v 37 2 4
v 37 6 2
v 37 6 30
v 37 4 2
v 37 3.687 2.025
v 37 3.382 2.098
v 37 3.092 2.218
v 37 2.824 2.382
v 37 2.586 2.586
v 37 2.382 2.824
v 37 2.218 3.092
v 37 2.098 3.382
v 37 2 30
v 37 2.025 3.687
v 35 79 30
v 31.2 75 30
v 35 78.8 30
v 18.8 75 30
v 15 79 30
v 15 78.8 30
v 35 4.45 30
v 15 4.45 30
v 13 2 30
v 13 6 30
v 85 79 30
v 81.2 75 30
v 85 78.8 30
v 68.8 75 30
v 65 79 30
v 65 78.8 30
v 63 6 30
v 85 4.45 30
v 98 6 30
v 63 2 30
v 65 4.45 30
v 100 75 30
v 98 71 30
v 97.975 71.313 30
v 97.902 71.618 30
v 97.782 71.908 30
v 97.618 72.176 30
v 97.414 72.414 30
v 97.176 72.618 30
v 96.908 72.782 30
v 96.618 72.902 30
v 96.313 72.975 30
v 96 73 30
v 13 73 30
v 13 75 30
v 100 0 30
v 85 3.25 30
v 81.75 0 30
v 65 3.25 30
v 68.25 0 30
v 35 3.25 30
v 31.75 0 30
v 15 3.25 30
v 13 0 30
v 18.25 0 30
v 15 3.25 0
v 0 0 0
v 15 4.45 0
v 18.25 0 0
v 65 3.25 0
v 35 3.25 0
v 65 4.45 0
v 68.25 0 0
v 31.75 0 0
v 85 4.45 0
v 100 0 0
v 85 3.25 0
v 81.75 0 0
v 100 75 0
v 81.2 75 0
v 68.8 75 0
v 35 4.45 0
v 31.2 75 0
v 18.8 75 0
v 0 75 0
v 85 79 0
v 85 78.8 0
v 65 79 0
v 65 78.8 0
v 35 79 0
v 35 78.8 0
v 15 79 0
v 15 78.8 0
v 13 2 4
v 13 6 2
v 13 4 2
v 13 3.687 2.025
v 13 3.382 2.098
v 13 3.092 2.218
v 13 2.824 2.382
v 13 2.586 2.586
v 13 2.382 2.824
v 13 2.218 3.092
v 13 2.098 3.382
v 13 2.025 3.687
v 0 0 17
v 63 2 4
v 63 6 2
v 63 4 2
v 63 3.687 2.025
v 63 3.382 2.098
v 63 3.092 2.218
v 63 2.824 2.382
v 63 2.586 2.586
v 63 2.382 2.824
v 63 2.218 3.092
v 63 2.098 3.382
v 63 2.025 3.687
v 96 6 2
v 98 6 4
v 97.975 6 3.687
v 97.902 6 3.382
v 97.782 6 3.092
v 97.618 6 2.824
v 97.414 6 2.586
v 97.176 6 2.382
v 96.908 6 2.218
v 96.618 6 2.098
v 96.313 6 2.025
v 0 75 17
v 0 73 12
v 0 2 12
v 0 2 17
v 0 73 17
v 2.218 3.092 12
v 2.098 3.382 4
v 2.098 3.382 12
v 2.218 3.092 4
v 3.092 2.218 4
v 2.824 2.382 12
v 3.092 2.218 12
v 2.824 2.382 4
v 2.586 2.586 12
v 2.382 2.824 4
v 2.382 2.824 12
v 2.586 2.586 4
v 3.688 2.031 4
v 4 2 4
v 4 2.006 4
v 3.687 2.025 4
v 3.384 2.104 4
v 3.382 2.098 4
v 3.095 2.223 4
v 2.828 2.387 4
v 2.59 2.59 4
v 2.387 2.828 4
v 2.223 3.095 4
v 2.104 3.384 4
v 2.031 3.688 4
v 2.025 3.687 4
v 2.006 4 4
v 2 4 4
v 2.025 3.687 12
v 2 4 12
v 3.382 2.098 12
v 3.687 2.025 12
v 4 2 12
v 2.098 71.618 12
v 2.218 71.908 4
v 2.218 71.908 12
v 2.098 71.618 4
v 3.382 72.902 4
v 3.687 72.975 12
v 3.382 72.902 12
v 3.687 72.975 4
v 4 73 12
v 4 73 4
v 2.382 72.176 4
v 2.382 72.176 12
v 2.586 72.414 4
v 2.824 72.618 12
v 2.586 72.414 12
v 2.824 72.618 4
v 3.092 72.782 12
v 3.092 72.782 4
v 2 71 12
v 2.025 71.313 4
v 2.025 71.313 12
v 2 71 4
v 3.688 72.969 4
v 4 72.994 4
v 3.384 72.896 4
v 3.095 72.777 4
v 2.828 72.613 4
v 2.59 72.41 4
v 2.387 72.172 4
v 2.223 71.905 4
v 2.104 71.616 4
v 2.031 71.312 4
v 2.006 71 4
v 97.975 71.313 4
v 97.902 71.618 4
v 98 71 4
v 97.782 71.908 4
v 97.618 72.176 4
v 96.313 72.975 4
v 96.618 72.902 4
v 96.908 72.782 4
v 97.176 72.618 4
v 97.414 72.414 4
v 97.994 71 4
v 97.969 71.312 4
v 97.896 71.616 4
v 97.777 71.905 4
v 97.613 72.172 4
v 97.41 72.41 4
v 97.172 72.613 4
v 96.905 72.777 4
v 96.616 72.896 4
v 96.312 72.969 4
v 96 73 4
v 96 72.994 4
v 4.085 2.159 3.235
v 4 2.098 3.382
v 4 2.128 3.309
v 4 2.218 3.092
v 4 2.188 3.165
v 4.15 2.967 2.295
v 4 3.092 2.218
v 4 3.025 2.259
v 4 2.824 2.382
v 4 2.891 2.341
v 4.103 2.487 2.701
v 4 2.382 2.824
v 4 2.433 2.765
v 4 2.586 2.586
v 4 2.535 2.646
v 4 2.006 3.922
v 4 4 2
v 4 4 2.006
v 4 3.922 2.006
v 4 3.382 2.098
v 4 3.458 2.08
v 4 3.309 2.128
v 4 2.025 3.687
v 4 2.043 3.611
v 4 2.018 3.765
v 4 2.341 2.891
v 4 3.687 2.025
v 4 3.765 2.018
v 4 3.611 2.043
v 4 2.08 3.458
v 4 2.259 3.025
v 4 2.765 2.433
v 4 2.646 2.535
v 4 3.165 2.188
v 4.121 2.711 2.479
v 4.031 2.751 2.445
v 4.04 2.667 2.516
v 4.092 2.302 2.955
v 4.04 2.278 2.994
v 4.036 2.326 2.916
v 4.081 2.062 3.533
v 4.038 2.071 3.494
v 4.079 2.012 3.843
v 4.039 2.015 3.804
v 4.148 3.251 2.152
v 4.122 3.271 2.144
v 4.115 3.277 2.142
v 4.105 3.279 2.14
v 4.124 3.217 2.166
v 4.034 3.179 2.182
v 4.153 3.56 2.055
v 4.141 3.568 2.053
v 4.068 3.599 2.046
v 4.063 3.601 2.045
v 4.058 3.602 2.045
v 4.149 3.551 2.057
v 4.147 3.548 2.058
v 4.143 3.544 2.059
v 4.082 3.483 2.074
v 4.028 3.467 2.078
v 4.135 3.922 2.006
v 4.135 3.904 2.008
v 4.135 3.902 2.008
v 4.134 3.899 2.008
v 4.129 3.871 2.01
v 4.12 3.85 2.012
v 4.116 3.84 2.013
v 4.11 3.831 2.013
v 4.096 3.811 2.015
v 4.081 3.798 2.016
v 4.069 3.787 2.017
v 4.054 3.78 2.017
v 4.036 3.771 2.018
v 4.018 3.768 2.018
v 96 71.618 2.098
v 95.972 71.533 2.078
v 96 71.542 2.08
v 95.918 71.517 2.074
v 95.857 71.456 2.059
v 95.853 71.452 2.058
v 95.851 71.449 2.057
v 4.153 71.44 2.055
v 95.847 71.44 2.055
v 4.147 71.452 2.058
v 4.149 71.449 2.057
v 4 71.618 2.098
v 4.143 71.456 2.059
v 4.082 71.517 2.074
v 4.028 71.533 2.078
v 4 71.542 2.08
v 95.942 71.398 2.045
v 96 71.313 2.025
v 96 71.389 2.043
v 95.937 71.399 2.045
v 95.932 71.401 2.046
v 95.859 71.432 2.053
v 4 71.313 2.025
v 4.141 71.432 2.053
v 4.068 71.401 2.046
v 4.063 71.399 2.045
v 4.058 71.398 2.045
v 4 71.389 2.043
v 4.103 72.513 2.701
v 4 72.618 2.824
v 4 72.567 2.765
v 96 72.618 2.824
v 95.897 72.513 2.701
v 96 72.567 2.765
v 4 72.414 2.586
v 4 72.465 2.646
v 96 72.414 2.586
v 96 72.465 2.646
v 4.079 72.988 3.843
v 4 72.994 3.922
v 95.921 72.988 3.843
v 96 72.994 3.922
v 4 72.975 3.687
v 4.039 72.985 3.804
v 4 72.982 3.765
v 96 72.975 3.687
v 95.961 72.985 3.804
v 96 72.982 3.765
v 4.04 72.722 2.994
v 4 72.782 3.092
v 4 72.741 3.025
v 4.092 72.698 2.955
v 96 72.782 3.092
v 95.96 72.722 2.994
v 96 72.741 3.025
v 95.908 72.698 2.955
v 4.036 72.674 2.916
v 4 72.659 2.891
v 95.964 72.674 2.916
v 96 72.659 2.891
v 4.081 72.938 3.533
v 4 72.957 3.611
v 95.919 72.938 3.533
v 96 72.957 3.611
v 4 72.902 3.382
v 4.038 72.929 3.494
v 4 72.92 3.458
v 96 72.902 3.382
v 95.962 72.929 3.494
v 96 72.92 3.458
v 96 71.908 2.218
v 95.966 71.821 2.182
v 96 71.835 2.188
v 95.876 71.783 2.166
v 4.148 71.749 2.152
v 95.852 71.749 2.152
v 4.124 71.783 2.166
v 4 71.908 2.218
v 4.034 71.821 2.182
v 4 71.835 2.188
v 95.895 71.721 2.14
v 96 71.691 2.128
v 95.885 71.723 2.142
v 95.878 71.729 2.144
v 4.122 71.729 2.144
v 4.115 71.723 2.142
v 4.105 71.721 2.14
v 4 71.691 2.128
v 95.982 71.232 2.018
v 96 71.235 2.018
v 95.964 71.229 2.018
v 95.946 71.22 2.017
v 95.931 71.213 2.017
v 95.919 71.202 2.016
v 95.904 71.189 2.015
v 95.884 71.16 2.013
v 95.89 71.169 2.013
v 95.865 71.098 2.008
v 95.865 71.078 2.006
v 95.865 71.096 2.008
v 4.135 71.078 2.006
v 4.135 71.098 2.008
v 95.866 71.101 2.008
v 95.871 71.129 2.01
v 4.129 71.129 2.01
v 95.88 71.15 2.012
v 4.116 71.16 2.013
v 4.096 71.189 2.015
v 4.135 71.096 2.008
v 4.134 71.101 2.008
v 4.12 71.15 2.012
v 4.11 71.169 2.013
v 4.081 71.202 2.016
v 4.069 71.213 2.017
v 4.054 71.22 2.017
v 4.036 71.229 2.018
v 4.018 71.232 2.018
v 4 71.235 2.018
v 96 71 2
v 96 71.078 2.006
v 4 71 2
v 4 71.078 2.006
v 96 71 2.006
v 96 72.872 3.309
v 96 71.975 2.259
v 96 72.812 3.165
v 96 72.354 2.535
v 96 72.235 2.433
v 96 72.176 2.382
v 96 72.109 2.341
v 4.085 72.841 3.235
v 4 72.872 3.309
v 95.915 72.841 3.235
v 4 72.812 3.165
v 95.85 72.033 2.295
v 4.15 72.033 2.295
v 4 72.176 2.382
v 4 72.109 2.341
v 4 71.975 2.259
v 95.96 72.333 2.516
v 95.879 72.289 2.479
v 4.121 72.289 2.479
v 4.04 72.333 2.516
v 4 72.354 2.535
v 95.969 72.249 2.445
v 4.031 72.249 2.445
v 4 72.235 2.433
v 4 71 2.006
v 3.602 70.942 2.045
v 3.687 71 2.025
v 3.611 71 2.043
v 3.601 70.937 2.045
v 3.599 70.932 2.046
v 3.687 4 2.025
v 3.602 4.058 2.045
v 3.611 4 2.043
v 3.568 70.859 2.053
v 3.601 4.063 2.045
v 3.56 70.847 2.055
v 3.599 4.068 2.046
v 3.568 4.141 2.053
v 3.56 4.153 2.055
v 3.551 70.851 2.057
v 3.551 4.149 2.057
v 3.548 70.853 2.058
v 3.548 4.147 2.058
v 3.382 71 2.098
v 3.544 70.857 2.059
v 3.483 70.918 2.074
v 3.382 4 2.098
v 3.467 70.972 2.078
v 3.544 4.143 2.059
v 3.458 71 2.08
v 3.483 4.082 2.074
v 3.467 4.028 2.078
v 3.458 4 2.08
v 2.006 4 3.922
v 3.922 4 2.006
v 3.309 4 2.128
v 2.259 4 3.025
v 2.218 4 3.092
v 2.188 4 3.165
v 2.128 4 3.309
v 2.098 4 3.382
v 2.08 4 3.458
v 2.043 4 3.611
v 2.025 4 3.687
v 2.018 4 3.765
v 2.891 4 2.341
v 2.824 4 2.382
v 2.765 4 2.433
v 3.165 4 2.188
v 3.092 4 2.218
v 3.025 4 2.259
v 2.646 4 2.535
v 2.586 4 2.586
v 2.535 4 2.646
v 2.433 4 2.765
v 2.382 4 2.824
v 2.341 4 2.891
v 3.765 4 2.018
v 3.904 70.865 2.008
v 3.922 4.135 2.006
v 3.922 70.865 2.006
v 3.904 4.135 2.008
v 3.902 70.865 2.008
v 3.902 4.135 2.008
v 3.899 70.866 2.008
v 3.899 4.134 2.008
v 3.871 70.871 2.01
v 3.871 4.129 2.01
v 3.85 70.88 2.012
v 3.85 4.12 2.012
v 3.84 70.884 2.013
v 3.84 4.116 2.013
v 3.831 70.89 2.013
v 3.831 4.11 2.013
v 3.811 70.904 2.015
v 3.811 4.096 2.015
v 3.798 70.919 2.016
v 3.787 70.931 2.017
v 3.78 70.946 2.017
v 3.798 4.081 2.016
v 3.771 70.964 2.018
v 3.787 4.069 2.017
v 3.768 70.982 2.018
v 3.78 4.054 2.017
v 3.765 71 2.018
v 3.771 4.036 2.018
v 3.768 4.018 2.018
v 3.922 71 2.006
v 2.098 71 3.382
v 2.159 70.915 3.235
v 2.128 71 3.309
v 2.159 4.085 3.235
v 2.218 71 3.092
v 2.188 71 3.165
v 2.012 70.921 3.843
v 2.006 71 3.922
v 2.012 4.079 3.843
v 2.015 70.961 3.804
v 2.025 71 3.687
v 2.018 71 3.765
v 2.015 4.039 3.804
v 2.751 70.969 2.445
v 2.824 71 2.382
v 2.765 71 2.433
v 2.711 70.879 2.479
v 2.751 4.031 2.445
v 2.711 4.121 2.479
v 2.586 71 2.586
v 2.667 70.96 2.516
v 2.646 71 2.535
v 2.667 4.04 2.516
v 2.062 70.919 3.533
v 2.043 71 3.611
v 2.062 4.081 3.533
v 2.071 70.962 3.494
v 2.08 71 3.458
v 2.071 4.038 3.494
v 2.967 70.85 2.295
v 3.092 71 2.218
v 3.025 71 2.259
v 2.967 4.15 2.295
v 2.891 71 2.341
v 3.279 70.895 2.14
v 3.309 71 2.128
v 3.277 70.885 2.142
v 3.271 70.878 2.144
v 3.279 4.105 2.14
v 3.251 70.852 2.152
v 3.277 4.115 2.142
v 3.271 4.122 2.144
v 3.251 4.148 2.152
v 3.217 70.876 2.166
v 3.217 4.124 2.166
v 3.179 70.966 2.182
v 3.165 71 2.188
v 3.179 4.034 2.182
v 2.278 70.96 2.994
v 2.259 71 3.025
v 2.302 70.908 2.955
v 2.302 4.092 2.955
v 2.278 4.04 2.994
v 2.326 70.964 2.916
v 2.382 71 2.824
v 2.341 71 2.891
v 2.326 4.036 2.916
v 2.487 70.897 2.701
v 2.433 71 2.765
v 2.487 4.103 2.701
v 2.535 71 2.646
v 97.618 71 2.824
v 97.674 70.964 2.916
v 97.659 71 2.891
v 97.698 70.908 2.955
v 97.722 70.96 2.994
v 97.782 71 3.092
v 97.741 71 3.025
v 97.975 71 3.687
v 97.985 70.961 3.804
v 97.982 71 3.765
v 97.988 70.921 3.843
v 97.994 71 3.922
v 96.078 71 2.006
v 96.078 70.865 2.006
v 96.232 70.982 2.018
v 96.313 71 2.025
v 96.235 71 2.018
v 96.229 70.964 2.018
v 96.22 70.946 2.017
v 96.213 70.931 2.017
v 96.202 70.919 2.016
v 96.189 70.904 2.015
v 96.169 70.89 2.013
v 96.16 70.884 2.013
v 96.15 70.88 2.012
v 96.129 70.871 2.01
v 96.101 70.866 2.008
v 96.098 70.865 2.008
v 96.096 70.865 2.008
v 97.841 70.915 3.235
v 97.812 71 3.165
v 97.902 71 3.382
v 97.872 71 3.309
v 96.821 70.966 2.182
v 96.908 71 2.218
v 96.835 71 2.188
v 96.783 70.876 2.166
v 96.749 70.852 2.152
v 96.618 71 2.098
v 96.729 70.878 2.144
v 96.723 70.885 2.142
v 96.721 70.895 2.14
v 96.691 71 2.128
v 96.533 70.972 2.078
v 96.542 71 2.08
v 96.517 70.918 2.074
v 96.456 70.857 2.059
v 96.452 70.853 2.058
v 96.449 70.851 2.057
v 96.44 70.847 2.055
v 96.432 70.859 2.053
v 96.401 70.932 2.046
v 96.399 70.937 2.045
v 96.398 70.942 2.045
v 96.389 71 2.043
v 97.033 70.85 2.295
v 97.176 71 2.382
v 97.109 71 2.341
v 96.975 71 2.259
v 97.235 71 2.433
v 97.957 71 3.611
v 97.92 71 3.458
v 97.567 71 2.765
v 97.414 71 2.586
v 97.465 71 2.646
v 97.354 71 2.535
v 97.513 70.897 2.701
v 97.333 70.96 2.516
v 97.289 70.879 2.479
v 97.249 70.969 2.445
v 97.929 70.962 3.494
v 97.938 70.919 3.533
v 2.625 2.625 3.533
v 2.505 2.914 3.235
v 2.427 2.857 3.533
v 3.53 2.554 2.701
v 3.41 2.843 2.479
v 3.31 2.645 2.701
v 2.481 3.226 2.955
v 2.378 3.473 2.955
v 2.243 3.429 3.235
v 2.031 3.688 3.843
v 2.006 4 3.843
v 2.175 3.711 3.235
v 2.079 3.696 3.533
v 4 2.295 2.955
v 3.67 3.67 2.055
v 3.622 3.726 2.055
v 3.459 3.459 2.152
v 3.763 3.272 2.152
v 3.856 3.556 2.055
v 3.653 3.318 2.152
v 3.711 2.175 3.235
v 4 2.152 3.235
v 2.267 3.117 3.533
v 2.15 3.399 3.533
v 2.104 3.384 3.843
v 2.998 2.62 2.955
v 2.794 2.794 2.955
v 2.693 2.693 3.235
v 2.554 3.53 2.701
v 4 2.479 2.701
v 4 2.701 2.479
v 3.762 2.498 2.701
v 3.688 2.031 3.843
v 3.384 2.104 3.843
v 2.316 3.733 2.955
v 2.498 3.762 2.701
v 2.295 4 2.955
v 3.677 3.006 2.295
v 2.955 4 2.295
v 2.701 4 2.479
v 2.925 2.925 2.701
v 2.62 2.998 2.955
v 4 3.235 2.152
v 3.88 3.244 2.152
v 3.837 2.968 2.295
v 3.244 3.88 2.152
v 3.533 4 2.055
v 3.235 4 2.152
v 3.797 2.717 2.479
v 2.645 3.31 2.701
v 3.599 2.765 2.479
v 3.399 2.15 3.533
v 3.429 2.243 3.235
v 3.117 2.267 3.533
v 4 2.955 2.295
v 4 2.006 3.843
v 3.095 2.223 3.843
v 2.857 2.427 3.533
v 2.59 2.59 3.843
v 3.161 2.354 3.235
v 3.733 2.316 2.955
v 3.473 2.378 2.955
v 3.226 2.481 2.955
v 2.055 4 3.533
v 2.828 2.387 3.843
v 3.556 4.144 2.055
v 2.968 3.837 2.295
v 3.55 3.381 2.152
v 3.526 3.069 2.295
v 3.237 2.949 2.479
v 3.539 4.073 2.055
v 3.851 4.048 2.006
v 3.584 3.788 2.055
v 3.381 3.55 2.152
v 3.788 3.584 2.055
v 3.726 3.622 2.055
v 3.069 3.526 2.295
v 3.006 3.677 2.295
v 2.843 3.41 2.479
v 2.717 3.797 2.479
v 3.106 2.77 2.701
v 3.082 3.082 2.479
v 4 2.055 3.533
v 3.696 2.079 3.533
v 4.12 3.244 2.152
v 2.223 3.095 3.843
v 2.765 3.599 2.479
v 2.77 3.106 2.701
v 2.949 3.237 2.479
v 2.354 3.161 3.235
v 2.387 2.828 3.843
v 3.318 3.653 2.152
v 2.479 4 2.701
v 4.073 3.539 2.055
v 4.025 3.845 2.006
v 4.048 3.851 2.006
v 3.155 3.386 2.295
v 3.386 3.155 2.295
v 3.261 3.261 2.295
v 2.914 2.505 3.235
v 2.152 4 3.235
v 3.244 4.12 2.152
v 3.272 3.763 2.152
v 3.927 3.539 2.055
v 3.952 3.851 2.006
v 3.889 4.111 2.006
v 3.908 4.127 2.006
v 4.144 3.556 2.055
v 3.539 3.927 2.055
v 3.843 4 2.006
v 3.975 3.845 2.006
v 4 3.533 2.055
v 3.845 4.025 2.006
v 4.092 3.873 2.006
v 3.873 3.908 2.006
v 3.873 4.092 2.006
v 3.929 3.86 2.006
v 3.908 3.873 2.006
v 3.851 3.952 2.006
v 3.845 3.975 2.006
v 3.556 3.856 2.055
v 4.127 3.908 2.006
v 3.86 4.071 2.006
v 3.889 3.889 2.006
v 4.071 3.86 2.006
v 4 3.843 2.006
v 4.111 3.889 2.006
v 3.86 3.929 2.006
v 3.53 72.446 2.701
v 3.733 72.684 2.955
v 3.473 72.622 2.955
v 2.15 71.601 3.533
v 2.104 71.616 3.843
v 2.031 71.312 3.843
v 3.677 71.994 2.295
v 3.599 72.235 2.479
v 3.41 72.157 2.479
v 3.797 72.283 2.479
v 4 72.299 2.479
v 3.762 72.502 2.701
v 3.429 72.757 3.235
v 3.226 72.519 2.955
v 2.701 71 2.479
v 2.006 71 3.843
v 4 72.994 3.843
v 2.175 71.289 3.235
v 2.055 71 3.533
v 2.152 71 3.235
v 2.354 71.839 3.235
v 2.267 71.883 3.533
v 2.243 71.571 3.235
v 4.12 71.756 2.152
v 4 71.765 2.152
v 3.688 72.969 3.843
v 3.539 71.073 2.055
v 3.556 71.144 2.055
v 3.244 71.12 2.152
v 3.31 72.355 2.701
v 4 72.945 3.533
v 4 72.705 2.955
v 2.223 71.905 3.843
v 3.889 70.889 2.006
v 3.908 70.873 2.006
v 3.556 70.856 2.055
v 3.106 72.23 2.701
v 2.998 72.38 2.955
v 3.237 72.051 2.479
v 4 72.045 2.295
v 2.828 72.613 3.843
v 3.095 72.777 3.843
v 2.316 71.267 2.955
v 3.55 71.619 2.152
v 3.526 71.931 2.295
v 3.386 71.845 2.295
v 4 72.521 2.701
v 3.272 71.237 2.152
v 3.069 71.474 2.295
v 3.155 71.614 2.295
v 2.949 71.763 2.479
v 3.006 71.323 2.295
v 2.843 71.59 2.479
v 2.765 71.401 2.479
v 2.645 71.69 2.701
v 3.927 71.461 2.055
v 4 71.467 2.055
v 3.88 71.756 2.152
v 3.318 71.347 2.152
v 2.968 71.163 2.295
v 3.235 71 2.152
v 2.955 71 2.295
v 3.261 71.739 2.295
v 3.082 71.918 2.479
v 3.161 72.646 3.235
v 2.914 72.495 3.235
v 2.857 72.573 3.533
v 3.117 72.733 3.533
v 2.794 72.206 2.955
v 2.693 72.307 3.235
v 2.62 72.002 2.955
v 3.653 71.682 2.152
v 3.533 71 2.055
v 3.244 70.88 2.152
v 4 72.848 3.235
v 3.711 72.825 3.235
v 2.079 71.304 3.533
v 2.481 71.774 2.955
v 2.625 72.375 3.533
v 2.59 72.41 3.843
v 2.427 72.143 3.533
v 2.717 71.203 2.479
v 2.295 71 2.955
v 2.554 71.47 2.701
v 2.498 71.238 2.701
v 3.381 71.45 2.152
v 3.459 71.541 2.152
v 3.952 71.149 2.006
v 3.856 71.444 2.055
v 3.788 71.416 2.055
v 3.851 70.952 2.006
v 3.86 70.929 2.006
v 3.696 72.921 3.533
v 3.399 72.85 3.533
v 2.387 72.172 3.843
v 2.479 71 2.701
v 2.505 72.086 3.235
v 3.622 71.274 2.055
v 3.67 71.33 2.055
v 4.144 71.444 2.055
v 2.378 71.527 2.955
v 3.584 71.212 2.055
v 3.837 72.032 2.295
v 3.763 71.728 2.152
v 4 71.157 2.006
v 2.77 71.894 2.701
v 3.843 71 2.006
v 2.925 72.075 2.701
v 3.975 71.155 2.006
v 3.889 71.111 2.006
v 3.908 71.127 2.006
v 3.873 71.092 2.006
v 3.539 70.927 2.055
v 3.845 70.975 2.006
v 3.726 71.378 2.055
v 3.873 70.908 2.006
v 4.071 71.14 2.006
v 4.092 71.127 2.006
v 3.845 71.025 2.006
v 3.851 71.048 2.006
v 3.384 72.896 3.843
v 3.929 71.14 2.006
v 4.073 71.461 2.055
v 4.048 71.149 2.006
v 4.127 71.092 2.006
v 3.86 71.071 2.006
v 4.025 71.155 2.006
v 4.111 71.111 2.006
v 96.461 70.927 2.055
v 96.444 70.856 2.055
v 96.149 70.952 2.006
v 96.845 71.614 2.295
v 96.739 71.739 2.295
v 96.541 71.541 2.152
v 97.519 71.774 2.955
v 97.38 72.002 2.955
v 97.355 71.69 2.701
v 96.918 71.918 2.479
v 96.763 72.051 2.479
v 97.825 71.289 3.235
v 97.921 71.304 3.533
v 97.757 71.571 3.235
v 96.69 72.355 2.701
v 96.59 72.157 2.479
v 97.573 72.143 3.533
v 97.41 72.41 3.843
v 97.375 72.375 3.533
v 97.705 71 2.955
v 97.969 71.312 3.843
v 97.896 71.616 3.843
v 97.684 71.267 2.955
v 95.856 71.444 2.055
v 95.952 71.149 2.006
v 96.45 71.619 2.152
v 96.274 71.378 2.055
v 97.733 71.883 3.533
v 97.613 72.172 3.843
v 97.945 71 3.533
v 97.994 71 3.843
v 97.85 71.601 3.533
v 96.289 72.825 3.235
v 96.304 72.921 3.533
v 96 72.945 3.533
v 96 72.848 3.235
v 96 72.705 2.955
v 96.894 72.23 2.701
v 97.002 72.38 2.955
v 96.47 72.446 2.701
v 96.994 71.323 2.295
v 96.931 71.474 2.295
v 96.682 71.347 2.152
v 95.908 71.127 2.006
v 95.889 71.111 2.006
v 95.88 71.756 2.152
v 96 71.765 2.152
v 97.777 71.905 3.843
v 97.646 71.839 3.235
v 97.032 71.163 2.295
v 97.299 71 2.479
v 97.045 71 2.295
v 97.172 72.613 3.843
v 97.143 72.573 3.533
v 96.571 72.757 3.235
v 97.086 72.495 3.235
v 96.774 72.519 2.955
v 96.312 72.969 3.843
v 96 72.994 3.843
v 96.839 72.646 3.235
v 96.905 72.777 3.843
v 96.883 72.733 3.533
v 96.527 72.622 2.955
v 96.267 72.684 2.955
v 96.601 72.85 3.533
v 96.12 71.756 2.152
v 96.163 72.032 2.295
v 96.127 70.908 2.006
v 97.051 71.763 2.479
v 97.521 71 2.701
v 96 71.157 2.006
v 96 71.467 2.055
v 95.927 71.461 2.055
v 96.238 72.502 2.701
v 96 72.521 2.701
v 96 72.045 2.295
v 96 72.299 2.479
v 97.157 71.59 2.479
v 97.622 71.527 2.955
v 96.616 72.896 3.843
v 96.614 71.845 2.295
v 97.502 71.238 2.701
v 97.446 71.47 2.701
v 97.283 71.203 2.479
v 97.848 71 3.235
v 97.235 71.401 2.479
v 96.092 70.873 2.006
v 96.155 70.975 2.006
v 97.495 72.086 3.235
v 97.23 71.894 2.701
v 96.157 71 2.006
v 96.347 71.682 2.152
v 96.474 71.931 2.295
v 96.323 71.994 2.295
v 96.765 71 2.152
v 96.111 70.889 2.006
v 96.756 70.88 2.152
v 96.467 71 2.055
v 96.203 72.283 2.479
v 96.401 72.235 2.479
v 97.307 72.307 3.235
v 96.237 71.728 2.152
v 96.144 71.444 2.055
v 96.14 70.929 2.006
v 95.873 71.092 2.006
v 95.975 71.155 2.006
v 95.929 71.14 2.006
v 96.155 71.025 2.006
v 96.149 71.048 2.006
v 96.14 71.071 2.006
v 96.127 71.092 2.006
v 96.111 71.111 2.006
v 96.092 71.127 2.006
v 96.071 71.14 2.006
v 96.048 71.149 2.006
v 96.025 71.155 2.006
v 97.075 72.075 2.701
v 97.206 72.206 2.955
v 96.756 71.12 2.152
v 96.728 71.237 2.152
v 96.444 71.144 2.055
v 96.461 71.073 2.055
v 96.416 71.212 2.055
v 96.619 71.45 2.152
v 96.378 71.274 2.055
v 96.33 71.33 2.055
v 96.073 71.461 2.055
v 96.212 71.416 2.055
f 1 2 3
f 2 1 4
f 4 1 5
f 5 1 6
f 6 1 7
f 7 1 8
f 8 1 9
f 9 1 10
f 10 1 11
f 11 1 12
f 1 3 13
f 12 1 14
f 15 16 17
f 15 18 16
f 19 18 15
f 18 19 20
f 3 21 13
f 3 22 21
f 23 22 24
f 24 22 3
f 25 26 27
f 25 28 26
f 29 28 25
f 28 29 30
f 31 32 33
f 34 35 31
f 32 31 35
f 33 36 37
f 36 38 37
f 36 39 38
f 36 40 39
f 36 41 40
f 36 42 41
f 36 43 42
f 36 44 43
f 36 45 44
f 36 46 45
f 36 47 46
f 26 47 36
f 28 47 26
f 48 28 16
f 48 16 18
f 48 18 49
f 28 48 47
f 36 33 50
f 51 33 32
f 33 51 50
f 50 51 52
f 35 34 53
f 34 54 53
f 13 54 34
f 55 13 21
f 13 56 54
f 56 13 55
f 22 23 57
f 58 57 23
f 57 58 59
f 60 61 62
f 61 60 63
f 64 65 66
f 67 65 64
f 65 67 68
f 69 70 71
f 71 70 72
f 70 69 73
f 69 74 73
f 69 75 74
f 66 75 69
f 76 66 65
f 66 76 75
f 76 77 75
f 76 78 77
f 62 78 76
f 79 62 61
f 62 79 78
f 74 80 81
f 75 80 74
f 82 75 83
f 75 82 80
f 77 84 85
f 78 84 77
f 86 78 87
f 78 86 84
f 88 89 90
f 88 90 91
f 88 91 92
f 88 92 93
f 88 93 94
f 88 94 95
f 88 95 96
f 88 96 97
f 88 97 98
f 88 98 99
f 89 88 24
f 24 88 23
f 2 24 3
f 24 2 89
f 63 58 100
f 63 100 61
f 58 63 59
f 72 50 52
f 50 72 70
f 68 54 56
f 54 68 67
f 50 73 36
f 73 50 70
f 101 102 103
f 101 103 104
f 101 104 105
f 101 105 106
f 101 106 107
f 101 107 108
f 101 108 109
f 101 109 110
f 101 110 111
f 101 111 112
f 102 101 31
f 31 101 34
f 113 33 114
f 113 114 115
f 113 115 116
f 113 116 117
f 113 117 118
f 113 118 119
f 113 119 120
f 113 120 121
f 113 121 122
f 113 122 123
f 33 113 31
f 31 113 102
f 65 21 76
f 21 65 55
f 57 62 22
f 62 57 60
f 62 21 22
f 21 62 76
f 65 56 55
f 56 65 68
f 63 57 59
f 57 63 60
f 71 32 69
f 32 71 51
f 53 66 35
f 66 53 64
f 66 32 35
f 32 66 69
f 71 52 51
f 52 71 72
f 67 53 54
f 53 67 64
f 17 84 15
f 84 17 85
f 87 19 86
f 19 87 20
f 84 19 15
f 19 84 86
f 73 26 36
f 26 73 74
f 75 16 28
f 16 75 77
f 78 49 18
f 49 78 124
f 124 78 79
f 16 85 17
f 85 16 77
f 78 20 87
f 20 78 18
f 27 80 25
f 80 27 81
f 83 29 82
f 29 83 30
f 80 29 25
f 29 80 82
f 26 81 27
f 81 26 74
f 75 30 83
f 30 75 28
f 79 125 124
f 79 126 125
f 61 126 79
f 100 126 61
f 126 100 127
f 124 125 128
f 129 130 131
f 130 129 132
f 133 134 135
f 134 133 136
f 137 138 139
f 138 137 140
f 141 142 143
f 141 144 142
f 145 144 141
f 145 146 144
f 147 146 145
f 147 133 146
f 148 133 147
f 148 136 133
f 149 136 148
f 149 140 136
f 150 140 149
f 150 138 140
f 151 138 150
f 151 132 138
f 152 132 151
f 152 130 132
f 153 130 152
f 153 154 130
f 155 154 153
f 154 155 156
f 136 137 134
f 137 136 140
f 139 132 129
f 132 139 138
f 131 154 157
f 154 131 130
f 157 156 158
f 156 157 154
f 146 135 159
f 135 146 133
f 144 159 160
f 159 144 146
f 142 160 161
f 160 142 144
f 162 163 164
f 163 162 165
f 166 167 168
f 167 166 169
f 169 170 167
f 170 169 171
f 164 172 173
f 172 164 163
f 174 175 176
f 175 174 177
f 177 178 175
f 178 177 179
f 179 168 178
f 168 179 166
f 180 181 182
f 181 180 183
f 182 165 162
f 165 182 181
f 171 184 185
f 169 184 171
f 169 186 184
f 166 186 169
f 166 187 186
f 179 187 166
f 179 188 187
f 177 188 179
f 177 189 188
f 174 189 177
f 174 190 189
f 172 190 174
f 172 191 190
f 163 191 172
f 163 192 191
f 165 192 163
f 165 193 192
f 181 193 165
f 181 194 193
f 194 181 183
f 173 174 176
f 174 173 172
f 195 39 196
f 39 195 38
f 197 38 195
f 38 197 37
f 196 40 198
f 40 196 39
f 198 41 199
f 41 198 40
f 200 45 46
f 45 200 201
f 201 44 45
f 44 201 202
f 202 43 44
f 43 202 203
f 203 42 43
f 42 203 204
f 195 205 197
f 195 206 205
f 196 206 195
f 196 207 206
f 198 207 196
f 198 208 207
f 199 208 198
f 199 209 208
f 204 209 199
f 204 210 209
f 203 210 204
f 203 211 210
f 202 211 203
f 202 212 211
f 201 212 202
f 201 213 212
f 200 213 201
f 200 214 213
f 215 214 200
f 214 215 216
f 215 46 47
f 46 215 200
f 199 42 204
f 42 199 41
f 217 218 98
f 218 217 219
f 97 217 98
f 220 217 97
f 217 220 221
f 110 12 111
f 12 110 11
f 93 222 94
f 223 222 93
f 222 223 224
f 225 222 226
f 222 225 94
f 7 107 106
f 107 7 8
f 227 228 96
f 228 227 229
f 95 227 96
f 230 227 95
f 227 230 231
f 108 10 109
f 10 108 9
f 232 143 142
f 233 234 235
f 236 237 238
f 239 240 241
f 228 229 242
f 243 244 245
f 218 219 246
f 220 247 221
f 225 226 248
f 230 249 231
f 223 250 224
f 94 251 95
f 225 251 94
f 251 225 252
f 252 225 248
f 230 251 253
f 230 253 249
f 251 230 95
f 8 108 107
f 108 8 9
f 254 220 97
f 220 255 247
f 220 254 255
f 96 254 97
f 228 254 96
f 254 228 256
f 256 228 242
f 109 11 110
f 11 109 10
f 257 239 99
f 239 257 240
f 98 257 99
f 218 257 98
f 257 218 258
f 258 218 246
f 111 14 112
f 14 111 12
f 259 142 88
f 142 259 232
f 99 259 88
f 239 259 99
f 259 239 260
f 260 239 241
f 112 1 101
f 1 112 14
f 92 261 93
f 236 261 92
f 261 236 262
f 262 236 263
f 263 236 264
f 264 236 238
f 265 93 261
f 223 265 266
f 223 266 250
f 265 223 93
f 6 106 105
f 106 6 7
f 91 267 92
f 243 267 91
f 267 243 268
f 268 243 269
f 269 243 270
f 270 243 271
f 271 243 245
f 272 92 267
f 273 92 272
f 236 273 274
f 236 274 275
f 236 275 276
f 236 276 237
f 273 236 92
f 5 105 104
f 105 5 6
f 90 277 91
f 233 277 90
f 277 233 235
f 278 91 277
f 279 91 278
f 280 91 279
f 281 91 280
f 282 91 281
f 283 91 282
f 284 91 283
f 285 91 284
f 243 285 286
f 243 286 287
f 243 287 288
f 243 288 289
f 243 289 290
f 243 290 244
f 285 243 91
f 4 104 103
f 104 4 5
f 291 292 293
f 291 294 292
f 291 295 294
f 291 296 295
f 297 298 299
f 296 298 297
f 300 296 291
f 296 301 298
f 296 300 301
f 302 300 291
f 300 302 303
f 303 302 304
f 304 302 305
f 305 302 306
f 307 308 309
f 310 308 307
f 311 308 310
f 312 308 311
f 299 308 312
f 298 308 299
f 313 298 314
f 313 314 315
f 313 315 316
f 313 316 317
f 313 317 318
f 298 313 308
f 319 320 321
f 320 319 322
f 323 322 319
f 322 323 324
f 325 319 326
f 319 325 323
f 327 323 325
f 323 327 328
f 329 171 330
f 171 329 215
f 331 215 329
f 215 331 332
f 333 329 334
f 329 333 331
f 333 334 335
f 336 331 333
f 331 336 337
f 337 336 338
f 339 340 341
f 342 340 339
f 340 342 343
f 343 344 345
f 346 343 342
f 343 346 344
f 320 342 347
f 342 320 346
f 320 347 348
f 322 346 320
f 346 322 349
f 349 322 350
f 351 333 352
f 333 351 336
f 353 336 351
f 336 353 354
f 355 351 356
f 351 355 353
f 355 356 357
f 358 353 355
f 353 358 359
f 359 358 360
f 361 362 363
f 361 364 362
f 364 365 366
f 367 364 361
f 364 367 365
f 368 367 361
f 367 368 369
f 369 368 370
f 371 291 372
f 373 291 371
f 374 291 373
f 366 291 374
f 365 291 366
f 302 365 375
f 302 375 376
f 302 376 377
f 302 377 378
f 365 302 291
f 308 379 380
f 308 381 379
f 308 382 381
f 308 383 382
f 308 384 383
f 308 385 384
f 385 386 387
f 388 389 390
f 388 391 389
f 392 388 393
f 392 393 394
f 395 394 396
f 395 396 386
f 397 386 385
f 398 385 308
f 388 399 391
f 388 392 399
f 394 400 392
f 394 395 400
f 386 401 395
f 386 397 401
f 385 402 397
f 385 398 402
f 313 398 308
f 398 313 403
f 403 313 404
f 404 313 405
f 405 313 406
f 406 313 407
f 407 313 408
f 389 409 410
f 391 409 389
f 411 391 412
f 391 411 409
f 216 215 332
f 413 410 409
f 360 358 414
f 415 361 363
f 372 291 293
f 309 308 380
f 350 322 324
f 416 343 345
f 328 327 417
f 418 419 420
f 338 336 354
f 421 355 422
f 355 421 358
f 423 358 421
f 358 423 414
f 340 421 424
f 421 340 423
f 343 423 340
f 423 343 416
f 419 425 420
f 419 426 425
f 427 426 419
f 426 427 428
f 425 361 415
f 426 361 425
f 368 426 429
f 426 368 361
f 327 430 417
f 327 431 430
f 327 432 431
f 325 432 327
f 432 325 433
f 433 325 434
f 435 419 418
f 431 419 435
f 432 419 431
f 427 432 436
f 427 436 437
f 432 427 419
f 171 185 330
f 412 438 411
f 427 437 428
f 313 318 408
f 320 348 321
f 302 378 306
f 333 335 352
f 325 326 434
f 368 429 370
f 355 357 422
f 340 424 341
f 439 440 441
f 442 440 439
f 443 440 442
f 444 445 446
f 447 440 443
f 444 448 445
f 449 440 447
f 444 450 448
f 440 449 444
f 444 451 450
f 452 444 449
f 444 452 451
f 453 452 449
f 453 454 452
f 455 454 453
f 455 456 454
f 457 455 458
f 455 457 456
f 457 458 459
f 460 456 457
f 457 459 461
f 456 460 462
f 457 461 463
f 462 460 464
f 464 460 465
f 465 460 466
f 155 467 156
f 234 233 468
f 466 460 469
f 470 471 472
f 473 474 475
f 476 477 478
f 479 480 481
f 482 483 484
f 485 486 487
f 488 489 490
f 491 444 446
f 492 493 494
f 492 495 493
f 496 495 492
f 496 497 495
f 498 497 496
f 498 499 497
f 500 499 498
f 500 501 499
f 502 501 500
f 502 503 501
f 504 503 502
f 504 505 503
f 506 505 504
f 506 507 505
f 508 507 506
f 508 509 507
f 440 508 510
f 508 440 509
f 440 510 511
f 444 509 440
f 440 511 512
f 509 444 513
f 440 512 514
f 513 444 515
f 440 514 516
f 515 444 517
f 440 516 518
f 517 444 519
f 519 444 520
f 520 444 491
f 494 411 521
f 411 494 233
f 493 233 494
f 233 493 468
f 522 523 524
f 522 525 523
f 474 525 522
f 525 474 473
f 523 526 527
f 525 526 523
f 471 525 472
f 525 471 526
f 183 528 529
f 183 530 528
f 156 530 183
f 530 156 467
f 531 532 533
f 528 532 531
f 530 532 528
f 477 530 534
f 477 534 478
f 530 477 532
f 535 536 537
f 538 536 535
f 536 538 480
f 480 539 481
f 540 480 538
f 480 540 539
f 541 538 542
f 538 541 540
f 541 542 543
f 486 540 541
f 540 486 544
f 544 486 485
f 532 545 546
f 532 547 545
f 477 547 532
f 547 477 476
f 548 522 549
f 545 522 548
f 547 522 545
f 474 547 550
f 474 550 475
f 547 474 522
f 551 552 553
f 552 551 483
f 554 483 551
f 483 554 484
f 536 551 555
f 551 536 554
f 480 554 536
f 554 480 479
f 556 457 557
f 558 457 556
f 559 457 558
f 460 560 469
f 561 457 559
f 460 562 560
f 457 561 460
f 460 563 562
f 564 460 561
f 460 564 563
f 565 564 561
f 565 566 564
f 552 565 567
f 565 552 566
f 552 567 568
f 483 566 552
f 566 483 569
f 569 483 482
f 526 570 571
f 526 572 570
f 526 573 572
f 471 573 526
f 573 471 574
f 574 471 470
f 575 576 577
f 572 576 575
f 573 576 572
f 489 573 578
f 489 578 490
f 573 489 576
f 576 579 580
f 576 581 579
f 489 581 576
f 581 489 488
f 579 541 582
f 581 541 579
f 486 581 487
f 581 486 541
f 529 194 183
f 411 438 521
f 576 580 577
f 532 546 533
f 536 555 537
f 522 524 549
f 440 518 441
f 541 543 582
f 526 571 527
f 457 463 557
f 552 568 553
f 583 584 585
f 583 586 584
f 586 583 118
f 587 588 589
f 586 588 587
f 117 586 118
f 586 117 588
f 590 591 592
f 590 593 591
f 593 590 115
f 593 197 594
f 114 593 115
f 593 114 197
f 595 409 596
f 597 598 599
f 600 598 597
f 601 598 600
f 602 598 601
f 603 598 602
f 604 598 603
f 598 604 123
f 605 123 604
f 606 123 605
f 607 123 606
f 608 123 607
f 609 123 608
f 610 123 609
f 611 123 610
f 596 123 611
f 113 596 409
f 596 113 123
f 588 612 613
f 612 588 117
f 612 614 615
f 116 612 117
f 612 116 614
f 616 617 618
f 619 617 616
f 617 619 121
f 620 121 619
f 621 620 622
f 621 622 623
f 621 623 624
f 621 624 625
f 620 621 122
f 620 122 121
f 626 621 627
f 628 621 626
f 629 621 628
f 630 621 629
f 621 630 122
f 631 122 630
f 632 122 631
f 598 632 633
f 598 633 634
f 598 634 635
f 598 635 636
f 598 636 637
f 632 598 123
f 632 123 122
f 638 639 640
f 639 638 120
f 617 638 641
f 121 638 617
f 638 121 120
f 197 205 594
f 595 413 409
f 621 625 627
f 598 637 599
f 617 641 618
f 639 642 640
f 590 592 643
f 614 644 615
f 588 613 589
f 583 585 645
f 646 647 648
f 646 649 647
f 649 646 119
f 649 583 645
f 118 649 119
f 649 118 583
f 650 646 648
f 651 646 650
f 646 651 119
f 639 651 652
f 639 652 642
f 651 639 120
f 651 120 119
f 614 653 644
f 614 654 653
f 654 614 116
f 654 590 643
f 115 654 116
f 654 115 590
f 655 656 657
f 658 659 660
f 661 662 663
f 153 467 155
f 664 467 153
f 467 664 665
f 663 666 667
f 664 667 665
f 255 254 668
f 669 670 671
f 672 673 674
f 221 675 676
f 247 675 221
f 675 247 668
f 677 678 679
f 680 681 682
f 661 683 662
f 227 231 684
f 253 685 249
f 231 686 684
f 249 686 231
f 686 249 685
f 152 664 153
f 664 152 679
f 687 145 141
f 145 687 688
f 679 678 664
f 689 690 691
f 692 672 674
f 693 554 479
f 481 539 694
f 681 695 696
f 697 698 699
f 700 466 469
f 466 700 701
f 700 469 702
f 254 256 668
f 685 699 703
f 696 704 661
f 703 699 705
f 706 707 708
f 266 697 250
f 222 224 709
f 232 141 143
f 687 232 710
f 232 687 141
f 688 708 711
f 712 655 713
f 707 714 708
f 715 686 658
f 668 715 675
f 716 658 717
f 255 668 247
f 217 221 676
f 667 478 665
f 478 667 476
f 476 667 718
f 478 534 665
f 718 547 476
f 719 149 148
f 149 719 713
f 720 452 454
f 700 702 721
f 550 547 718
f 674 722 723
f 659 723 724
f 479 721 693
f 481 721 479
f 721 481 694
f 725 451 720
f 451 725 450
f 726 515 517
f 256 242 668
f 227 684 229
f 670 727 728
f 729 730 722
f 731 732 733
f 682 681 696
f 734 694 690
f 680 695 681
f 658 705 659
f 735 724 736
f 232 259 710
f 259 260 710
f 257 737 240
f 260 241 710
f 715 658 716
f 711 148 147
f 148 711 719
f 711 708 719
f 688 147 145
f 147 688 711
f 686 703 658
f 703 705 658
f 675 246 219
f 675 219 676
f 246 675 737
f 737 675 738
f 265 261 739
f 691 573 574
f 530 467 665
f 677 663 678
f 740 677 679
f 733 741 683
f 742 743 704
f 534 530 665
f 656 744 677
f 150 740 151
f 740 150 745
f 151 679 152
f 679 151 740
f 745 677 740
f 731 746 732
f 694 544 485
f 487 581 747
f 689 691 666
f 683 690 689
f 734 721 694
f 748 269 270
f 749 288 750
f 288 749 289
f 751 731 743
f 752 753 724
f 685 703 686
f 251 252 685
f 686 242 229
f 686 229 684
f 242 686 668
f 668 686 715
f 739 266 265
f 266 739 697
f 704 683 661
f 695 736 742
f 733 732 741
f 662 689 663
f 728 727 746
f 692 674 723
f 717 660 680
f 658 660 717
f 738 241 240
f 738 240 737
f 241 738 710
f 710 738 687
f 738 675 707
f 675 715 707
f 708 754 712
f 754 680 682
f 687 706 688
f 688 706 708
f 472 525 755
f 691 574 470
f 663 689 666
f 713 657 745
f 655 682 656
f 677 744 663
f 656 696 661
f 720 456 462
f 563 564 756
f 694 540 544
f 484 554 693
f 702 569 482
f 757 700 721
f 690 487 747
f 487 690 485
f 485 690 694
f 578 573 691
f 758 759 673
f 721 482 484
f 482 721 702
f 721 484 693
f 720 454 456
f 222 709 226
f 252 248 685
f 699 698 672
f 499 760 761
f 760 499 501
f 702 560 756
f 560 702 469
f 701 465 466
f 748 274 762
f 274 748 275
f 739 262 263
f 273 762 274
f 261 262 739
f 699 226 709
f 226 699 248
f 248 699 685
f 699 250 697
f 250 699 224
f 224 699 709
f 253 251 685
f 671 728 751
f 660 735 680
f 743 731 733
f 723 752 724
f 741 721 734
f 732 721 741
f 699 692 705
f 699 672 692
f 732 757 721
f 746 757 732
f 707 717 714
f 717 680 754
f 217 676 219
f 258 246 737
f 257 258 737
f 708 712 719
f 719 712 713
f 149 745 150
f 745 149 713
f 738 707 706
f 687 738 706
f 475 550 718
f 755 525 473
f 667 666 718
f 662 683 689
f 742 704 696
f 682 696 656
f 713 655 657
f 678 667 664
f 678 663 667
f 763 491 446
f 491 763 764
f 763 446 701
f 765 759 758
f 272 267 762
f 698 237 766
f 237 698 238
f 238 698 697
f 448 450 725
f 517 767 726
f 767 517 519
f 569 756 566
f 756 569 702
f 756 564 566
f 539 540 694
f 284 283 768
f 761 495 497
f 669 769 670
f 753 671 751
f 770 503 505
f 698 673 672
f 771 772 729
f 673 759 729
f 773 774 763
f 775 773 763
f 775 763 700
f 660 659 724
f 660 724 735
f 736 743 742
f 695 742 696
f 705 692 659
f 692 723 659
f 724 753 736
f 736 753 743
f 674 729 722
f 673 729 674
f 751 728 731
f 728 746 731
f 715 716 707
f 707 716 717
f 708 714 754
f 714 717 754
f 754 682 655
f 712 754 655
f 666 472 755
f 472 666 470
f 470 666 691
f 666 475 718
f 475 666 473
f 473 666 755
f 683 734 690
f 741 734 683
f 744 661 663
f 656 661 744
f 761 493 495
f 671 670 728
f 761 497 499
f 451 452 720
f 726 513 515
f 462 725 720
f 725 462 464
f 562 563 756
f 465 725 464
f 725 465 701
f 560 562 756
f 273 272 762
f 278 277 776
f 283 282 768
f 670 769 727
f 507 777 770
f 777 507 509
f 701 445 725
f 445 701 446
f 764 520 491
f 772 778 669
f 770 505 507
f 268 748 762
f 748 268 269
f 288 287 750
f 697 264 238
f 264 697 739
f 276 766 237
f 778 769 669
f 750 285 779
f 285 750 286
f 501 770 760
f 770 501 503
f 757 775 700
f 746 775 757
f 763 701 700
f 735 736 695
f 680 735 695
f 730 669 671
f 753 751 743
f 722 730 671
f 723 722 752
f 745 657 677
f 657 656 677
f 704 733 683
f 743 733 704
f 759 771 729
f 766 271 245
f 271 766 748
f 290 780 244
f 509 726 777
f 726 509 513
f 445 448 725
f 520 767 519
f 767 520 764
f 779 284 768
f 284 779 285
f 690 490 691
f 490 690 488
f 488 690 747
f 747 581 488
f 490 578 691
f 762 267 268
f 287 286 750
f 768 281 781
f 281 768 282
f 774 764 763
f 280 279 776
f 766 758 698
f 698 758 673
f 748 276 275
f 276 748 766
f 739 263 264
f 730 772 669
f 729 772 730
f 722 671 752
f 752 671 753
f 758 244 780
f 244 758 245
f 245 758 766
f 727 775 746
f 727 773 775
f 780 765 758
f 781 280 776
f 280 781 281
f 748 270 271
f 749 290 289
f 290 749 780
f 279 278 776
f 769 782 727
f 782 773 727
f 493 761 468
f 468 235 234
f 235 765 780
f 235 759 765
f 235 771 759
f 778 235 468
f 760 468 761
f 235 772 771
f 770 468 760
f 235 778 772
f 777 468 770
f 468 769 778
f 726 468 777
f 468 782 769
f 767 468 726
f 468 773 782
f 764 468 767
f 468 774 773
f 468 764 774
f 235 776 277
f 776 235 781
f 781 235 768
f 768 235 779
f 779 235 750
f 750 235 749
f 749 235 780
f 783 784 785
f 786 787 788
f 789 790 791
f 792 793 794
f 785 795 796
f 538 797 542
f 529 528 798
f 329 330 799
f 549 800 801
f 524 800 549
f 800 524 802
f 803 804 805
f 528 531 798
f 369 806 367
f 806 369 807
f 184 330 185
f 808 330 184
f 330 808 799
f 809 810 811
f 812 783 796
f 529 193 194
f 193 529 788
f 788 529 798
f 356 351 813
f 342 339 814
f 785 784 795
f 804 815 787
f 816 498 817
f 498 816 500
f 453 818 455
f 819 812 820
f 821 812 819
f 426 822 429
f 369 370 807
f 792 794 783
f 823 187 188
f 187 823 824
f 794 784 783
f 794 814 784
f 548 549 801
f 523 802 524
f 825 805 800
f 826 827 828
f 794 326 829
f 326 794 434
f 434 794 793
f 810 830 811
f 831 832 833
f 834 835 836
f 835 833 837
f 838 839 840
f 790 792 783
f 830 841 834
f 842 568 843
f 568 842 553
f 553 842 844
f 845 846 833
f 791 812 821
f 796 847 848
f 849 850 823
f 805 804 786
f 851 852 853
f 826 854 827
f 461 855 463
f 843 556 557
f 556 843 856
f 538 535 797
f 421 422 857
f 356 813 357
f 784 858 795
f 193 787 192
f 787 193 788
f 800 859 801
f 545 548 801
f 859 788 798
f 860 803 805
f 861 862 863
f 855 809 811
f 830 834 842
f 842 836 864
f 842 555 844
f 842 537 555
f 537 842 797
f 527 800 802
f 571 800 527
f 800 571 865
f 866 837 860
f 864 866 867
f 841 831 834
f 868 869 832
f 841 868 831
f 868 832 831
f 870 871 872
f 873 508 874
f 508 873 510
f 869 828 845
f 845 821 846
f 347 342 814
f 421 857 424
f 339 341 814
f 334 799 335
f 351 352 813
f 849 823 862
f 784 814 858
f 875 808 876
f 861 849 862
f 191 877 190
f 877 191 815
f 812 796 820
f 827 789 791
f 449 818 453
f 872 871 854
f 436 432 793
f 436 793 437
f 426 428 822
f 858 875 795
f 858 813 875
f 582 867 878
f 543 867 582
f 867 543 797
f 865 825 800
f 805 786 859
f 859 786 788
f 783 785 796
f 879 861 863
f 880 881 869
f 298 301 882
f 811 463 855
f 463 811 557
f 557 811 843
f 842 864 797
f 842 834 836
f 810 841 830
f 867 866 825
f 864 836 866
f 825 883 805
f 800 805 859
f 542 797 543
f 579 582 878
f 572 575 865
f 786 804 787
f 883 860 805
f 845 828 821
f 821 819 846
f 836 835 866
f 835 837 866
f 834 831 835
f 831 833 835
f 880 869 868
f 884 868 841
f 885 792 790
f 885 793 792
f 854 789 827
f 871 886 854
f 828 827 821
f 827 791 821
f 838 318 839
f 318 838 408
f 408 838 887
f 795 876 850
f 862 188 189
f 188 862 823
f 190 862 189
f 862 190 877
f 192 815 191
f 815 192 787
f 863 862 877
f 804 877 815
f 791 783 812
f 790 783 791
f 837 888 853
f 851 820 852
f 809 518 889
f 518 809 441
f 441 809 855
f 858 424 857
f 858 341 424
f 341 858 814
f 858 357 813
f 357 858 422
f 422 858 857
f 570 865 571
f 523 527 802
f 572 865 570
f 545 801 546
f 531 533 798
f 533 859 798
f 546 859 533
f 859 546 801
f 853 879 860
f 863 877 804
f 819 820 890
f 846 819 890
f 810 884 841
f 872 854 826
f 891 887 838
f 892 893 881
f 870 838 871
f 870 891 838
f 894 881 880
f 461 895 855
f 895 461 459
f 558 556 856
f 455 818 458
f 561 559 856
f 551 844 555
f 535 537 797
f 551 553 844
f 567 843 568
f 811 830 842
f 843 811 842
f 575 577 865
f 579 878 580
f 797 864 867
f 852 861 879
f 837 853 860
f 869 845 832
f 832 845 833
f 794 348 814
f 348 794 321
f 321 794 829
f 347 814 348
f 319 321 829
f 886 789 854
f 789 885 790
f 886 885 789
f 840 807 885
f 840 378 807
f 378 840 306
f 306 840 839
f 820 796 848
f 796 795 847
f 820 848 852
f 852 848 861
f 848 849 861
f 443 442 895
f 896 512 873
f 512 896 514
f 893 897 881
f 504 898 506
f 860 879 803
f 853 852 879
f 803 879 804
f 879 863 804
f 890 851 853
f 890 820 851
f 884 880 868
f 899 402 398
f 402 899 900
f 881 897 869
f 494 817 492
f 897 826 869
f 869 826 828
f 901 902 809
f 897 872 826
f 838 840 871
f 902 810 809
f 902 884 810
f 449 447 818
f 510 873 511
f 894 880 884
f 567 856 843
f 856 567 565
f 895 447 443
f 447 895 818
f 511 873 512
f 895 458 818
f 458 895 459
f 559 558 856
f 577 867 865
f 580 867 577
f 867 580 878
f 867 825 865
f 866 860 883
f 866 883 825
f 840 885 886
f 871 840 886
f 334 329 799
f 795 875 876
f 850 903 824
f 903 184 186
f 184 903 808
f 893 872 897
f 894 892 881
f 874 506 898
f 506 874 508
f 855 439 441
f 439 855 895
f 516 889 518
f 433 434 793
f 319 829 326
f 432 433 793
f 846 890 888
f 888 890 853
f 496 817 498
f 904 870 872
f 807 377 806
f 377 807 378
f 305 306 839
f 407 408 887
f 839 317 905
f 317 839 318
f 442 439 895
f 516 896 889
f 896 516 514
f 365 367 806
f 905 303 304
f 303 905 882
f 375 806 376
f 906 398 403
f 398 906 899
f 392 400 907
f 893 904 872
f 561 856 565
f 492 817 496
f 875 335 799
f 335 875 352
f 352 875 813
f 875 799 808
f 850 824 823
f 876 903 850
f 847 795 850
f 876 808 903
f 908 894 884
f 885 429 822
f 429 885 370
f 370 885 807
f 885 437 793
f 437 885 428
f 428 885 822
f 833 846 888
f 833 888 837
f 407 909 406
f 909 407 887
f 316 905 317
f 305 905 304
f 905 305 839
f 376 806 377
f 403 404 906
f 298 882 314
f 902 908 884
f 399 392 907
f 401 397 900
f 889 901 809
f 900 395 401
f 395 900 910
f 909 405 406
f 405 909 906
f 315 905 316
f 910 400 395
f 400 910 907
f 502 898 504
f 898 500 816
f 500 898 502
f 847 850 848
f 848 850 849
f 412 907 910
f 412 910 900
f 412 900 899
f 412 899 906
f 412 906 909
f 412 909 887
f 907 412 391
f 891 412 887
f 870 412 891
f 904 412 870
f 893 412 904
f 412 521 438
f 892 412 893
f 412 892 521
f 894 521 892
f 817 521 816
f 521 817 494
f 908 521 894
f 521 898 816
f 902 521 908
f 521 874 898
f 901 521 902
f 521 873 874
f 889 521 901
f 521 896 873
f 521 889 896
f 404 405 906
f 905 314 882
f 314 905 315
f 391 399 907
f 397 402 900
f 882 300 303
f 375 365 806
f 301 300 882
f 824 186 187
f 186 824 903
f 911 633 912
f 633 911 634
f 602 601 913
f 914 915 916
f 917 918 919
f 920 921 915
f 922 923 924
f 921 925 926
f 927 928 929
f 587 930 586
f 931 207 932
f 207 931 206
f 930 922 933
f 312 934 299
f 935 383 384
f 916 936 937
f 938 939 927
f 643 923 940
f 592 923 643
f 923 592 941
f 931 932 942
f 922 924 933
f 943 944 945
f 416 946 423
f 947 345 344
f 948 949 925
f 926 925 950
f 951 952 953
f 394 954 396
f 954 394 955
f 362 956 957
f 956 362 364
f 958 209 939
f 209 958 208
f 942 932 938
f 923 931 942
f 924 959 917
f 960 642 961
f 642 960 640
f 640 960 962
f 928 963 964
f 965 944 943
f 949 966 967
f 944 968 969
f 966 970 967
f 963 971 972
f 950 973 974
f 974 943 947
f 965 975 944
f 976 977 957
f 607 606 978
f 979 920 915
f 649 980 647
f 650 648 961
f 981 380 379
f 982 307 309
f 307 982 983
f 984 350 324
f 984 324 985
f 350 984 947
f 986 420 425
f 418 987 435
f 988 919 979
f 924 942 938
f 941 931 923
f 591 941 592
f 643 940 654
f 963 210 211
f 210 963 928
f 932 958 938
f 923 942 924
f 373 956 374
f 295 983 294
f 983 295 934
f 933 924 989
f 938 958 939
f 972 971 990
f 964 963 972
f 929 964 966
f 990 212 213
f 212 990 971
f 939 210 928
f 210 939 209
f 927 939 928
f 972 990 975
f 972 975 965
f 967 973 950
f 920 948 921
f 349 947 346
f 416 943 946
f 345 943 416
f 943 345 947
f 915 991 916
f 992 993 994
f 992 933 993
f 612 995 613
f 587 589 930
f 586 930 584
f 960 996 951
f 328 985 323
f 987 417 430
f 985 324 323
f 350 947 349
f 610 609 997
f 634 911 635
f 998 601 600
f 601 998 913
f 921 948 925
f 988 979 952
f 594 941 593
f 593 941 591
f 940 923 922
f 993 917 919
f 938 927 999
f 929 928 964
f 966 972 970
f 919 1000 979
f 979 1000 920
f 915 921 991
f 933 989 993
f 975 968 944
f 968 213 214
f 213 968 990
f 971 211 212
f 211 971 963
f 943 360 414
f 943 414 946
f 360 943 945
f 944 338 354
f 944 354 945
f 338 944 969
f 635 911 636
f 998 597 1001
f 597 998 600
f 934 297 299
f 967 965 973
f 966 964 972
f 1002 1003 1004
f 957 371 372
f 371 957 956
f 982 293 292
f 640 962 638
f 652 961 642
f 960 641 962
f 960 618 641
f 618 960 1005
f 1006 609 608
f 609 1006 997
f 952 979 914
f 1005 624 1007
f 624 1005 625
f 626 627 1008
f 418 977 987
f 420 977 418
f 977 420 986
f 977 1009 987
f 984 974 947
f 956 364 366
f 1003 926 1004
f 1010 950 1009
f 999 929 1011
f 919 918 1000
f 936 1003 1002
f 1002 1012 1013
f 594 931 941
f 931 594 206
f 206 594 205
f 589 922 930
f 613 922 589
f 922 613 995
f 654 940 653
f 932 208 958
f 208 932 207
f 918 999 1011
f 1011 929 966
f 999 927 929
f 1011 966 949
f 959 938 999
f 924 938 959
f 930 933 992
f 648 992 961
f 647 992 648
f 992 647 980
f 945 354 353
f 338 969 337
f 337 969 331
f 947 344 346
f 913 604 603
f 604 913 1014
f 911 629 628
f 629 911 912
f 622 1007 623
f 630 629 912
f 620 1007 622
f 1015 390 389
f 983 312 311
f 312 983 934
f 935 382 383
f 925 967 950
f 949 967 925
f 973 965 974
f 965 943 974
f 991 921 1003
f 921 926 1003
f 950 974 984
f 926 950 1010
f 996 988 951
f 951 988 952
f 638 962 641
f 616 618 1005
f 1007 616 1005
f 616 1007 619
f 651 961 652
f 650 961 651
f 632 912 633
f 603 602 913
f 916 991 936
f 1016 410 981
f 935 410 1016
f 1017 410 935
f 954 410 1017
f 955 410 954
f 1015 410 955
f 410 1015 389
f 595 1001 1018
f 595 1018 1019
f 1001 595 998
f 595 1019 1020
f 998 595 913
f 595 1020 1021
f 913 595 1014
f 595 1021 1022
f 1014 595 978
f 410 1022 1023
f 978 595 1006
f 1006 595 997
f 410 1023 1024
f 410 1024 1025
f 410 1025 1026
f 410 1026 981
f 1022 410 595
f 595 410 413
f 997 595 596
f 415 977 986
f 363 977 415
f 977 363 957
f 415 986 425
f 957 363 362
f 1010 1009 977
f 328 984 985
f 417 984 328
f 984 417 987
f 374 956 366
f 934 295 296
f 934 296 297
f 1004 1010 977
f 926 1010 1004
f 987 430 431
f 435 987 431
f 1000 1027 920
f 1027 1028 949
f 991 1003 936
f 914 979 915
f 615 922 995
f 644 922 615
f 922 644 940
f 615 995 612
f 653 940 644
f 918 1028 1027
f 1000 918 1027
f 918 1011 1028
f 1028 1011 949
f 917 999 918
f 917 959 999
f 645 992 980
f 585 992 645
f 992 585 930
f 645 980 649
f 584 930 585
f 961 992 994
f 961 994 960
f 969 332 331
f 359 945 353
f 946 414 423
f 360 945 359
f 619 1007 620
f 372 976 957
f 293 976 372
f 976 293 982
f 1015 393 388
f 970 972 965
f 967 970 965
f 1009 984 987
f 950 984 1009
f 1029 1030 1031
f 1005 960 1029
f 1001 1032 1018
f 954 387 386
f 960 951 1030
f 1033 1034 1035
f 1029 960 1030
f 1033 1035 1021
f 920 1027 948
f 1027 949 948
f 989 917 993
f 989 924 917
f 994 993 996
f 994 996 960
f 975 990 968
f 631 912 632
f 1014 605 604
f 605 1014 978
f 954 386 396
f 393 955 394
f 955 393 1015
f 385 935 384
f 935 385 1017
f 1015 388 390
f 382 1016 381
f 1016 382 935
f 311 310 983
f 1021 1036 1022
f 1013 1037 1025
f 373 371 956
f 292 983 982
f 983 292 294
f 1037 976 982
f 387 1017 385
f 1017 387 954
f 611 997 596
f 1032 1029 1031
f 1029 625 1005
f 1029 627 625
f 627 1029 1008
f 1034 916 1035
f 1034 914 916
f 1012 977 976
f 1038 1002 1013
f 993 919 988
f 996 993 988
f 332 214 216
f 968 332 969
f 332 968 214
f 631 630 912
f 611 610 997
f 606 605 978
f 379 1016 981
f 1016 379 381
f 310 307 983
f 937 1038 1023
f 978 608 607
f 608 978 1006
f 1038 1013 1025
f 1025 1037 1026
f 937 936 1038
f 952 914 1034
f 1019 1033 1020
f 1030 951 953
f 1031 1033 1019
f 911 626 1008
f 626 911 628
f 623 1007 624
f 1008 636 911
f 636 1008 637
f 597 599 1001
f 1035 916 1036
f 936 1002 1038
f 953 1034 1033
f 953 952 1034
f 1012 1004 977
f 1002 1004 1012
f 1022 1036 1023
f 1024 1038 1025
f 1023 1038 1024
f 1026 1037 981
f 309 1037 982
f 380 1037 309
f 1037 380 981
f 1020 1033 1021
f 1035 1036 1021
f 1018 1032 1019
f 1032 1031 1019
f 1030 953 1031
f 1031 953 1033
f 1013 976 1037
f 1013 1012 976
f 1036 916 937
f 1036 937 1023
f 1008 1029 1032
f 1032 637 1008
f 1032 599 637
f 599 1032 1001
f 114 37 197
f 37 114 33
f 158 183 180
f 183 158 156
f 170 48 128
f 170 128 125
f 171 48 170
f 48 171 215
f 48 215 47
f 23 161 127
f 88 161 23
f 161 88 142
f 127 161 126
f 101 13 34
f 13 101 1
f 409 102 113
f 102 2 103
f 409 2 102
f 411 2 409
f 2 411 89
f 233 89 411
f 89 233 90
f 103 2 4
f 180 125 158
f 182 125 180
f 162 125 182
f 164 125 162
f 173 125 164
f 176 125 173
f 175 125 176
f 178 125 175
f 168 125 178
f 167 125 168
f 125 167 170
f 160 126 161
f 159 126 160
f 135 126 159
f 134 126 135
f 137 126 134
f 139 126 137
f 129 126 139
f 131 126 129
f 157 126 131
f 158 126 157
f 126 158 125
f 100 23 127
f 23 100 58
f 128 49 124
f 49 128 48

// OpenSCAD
$fn = 40;

include <MCAD/boxes.scad>

module roundedBox2(size, radius, sidesonly) {
	translate([size[0]/2, size[1]/2, size[2]/2]) roundedBox(size, radius, sidesonly);
}

width = 20;
depth = 4;
height = 100;

module cut(gap, height) {
	offset = 0.2;
	difference() {
		translate([-width / 2, 0, 0]) cube([width, depth+gap, height]);
		translate([width / 2 + 1, depth + 1 - offset - gap, 0]) rotate([0, 0, -45]) translate([0, -3 * width, -1]) cube([3 * width, 3 * width, 2 * height]);

		translate([-width / 2 - 1, depth + 1 - offset - gap, 0]) rotate([0, 0, -45]) translate([0, -3 * width, -1]) cube([3 * width, 3 * width, 2 * height]);
	}

}

h = 30;
wall = 2;
length = 100;

module connector() {
	cylinder(r1 = 2.5, r2 = 1.5, h = 2);
}

difference() {
	union() {
//#translate([length - 3, 3, h]) connector();
//#translate([25, 75, h]) connector();
//#translate([length - 3, 3, h]) connector();
		translate([25 - width / 2 - wall, 0, 0]) cube([width+2*wall, depth +wall, h]);
		translate([length- (25+width/2+wall), 0, 0]) cube([25+width/2+wall, depth+wall, h]);
	}
	translate([25, -0.05, -1]) cut(0.5, height);
	translate([length-25, -0.05, -1]) cut(0.5, height);
}

difference() {
	difference() {
		union() {
			cube([length, 75, h]);
			translate([25, 75, 0]) cut(0, h);
			translate([length-25, 75, 0]) cut(0, h);
		}
		translate([25, -0.05, -1]) cut(0.5, height);
		translate([length-25, -0.05, -1]) cut(0.5, height);
	}
	translate([wall, wall, wall]) roundedBox2([100 - 2 * wall, 75 - 2 * wall, h], 2, false);
	translate([-wall, wall, wall + 10]) cube([3 * wall, 75 - 2 * wall, h], 2, false);
	translate([0, -wall, wall + 15]) rotate([0, -45, 0]) cube([30, 75 + 2 * wall, h], 2, false);
}	
